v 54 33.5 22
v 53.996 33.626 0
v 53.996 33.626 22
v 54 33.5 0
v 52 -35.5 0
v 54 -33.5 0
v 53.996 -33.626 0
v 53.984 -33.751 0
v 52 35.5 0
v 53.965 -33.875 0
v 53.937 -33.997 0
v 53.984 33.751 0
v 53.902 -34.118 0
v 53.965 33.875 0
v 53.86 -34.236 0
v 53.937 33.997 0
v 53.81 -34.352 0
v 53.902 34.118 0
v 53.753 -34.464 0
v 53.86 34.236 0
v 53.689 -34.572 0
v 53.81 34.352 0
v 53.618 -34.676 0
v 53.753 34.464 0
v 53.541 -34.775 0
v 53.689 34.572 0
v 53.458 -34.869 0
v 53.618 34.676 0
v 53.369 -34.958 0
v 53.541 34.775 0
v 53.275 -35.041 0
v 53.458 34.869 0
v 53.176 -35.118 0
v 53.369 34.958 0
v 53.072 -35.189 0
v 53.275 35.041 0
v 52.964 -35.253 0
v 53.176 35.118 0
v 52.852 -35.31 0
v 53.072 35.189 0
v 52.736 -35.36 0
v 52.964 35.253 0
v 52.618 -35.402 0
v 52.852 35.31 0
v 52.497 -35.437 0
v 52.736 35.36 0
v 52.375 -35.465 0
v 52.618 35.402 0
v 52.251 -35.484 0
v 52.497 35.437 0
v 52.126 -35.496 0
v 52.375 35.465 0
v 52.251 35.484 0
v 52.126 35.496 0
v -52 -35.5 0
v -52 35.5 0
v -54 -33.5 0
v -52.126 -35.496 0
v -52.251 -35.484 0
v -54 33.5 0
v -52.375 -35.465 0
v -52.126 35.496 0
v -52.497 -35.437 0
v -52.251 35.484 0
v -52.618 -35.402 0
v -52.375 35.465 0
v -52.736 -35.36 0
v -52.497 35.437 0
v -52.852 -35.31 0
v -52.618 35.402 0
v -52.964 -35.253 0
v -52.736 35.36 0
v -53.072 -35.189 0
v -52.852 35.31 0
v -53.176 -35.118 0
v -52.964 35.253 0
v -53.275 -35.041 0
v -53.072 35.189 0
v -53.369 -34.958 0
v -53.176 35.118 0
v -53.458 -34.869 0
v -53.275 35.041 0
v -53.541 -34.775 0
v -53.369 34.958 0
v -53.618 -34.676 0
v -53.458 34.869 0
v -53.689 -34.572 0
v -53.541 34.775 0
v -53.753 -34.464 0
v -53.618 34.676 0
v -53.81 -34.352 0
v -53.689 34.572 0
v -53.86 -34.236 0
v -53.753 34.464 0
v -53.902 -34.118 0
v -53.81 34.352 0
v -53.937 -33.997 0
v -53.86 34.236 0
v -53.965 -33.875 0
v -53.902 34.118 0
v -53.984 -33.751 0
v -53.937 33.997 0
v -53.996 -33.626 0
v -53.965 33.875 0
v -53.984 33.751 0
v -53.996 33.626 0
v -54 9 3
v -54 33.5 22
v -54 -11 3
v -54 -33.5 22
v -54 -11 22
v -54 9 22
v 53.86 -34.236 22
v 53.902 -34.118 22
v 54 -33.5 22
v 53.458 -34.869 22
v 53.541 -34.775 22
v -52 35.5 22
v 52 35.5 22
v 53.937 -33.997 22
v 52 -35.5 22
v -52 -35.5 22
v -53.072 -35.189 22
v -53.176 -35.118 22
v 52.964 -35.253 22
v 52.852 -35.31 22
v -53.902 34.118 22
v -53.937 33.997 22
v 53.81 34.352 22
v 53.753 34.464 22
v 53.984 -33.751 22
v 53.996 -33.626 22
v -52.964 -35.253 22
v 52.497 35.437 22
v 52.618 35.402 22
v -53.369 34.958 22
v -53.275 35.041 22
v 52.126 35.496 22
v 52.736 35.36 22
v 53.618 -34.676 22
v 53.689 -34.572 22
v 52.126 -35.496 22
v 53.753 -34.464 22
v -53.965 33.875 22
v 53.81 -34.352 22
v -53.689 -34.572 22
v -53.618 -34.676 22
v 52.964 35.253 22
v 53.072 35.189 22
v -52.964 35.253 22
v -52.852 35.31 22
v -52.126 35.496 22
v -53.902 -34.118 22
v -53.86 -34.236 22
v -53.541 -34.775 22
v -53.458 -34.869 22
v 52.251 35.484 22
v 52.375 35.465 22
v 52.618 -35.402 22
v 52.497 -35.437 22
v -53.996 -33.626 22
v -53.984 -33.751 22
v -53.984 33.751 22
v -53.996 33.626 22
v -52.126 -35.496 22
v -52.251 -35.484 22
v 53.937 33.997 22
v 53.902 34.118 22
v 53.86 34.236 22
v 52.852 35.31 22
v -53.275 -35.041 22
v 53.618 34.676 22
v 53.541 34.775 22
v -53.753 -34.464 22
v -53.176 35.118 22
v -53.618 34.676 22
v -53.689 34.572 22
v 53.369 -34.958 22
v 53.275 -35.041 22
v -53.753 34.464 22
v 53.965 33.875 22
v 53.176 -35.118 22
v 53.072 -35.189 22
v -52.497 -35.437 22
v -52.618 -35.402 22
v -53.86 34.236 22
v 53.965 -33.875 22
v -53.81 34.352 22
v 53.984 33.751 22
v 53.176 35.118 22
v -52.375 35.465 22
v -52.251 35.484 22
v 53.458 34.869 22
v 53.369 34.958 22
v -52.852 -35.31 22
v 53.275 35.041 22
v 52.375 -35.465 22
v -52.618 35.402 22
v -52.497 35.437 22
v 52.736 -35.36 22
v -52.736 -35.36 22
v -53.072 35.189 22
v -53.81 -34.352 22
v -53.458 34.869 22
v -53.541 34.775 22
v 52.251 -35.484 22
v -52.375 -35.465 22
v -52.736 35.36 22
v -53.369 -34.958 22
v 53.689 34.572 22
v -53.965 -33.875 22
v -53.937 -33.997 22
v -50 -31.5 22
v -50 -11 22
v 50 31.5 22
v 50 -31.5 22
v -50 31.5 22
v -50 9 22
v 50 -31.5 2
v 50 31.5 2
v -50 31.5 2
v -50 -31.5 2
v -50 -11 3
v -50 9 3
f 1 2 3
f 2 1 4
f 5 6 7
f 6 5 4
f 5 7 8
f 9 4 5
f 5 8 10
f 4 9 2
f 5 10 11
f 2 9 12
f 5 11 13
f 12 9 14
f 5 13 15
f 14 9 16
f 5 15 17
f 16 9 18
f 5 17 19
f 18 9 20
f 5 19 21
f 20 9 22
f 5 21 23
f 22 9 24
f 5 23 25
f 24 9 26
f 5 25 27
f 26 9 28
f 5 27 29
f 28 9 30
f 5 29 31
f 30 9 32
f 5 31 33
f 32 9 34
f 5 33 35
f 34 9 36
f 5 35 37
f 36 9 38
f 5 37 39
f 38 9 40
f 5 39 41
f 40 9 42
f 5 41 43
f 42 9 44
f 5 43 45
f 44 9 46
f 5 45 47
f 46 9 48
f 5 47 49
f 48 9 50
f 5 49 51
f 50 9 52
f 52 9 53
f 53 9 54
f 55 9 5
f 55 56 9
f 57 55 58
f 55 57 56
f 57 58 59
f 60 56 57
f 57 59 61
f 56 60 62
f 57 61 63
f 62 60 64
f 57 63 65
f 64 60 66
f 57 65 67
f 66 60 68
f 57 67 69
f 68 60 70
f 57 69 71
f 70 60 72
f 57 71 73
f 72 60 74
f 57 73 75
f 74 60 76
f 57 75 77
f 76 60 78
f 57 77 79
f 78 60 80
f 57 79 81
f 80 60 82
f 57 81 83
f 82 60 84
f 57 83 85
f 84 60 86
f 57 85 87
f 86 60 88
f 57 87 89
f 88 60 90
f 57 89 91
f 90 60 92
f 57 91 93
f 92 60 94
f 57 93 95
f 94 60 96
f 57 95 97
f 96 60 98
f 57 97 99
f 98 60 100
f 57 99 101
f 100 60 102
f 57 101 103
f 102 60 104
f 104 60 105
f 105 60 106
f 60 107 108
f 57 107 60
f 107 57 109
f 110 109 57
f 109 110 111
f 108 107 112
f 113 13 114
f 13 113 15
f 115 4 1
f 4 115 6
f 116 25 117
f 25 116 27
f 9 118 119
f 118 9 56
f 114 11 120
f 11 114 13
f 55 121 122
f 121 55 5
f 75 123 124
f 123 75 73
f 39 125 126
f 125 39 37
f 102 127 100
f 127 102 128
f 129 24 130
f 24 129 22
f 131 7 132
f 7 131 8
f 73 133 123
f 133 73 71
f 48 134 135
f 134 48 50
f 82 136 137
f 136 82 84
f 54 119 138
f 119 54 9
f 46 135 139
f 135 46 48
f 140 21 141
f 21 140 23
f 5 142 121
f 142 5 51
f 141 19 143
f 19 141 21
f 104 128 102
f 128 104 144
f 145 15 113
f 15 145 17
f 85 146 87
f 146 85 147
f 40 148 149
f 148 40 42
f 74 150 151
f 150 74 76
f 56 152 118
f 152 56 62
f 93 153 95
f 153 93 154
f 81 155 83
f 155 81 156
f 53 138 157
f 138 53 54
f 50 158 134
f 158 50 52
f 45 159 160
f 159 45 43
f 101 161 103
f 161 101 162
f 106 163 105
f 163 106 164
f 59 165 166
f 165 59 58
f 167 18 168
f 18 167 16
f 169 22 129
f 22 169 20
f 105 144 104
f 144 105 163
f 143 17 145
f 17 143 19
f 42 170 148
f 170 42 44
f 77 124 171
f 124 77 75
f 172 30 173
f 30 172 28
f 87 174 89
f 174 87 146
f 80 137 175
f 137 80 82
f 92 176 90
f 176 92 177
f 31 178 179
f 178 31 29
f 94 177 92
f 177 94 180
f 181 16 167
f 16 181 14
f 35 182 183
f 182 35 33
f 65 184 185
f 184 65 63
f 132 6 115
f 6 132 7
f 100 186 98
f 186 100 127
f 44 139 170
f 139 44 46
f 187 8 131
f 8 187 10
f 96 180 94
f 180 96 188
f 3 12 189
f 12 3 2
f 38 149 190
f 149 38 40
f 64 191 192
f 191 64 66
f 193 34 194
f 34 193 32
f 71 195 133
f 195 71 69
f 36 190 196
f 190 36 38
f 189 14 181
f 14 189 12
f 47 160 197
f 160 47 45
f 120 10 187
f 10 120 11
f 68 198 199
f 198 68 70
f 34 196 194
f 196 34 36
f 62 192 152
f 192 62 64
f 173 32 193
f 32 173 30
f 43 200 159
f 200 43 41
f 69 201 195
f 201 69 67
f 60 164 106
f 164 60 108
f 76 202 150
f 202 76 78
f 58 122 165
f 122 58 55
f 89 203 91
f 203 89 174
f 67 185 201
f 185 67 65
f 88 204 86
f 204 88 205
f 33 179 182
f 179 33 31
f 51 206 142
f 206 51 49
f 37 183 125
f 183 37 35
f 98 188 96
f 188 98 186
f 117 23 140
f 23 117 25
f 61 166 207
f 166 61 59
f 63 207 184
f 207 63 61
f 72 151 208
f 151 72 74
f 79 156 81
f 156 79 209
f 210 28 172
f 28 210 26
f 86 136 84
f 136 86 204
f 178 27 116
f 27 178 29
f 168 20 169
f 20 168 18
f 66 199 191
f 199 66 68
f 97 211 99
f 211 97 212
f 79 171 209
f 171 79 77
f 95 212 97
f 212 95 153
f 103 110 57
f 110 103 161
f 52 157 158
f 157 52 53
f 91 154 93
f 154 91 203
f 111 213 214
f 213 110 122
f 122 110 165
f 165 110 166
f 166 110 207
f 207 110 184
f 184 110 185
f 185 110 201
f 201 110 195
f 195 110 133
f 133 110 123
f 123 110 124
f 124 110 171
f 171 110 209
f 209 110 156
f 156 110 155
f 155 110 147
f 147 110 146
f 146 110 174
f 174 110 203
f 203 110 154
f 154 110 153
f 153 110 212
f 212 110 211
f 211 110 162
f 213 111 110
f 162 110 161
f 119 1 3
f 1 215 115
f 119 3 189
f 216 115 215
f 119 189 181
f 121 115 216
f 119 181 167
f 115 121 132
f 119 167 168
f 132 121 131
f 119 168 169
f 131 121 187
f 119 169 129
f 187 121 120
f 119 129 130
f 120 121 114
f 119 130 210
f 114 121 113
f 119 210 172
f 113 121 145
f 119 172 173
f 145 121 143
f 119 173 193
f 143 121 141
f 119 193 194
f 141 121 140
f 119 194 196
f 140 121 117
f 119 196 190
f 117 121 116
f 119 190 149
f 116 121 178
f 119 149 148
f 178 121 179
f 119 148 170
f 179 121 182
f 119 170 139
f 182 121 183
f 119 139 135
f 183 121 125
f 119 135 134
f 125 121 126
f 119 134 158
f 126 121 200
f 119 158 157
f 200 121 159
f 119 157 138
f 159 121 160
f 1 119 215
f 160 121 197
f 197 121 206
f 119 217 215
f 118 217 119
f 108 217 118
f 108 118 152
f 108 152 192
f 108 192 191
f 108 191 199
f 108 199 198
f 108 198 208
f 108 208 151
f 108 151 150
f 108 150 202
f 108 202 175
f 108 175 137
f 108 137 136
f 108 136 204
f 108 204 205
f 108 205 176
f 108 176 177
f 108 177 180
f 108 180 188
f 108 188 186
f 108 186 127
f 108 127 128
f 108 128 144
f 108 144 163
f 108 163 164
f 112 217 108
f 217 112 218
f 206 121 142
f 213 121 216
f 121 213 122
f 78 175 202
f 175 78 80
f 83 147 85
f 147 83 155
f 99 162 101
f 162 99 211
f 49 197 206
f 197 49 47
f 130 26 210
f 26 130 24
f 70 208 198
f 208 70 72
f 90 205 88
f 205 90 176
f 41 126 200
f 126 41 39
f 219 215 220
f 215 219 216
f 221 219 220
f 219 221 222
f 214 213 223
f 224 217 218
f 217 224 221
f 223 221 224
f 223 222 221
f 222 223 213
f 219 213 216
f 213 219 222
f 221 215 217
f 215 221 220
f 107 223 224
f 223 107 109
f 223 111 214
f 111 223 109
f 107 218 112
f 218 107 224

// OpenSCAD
inner_width=63;
inner_length=100;
thickness=2;
height=20;

textcontent="4";
textheight=30;
textspace=0.5;
textthickness=2;
textoffset=10;

//
include <write/Write.scad>

	
//derived
outter_width=inner_width+thickness*2;
outter_length=inner_length+thickness*2;
outter_height=height+thickness;

$fn=100;

module outter_box() {
		minkowski(){
		cylinder(r=2,h=0.0001);
		cube([outter_length,outter_width,outter_height]);
		}
}



module inner_box() {
	cube([inner_length,inner_width,height+1]);
}

//move to center
translate([-outter_length/2,outter_width/2,outter_height]){
//turn around
rotate([180,0,0]){
difference(){
	outter_box();
	translate([thickness,thickness,-1]){
		inner_box();
	}
	translate([outter_length/2-10,outter_width/2+textoffset,outter_height-0.5]){
	 rotate([0,0,-90]){
		 write(textcontent,h=textheight,t=textthickness); 
	 }
	}

	//cable hole
	translate([-10,outter_width/2-9,-1]){
		cube([100,20,height]);
	}
	
}
}
}

/*
difference(){
	//first block
	translate([thickness,thickness,height]){
		rotate([0,5,0]){
			cube([42,inner_width,height+5]);
		}
	}
 
	translate([0,0,height]){
		cube([outter_length,outter_width,100]);
	}
}


difference(){
	//2nd block
	translate([thickness+39,thickness,height-3]){
		rotate([0,10,0]){
			cube([62,inner_width,height+5]);
		}
	}
 
	translate([0,0,height]){
		cube([outter_length+10,outter_width,100]);
	}
}
*/
